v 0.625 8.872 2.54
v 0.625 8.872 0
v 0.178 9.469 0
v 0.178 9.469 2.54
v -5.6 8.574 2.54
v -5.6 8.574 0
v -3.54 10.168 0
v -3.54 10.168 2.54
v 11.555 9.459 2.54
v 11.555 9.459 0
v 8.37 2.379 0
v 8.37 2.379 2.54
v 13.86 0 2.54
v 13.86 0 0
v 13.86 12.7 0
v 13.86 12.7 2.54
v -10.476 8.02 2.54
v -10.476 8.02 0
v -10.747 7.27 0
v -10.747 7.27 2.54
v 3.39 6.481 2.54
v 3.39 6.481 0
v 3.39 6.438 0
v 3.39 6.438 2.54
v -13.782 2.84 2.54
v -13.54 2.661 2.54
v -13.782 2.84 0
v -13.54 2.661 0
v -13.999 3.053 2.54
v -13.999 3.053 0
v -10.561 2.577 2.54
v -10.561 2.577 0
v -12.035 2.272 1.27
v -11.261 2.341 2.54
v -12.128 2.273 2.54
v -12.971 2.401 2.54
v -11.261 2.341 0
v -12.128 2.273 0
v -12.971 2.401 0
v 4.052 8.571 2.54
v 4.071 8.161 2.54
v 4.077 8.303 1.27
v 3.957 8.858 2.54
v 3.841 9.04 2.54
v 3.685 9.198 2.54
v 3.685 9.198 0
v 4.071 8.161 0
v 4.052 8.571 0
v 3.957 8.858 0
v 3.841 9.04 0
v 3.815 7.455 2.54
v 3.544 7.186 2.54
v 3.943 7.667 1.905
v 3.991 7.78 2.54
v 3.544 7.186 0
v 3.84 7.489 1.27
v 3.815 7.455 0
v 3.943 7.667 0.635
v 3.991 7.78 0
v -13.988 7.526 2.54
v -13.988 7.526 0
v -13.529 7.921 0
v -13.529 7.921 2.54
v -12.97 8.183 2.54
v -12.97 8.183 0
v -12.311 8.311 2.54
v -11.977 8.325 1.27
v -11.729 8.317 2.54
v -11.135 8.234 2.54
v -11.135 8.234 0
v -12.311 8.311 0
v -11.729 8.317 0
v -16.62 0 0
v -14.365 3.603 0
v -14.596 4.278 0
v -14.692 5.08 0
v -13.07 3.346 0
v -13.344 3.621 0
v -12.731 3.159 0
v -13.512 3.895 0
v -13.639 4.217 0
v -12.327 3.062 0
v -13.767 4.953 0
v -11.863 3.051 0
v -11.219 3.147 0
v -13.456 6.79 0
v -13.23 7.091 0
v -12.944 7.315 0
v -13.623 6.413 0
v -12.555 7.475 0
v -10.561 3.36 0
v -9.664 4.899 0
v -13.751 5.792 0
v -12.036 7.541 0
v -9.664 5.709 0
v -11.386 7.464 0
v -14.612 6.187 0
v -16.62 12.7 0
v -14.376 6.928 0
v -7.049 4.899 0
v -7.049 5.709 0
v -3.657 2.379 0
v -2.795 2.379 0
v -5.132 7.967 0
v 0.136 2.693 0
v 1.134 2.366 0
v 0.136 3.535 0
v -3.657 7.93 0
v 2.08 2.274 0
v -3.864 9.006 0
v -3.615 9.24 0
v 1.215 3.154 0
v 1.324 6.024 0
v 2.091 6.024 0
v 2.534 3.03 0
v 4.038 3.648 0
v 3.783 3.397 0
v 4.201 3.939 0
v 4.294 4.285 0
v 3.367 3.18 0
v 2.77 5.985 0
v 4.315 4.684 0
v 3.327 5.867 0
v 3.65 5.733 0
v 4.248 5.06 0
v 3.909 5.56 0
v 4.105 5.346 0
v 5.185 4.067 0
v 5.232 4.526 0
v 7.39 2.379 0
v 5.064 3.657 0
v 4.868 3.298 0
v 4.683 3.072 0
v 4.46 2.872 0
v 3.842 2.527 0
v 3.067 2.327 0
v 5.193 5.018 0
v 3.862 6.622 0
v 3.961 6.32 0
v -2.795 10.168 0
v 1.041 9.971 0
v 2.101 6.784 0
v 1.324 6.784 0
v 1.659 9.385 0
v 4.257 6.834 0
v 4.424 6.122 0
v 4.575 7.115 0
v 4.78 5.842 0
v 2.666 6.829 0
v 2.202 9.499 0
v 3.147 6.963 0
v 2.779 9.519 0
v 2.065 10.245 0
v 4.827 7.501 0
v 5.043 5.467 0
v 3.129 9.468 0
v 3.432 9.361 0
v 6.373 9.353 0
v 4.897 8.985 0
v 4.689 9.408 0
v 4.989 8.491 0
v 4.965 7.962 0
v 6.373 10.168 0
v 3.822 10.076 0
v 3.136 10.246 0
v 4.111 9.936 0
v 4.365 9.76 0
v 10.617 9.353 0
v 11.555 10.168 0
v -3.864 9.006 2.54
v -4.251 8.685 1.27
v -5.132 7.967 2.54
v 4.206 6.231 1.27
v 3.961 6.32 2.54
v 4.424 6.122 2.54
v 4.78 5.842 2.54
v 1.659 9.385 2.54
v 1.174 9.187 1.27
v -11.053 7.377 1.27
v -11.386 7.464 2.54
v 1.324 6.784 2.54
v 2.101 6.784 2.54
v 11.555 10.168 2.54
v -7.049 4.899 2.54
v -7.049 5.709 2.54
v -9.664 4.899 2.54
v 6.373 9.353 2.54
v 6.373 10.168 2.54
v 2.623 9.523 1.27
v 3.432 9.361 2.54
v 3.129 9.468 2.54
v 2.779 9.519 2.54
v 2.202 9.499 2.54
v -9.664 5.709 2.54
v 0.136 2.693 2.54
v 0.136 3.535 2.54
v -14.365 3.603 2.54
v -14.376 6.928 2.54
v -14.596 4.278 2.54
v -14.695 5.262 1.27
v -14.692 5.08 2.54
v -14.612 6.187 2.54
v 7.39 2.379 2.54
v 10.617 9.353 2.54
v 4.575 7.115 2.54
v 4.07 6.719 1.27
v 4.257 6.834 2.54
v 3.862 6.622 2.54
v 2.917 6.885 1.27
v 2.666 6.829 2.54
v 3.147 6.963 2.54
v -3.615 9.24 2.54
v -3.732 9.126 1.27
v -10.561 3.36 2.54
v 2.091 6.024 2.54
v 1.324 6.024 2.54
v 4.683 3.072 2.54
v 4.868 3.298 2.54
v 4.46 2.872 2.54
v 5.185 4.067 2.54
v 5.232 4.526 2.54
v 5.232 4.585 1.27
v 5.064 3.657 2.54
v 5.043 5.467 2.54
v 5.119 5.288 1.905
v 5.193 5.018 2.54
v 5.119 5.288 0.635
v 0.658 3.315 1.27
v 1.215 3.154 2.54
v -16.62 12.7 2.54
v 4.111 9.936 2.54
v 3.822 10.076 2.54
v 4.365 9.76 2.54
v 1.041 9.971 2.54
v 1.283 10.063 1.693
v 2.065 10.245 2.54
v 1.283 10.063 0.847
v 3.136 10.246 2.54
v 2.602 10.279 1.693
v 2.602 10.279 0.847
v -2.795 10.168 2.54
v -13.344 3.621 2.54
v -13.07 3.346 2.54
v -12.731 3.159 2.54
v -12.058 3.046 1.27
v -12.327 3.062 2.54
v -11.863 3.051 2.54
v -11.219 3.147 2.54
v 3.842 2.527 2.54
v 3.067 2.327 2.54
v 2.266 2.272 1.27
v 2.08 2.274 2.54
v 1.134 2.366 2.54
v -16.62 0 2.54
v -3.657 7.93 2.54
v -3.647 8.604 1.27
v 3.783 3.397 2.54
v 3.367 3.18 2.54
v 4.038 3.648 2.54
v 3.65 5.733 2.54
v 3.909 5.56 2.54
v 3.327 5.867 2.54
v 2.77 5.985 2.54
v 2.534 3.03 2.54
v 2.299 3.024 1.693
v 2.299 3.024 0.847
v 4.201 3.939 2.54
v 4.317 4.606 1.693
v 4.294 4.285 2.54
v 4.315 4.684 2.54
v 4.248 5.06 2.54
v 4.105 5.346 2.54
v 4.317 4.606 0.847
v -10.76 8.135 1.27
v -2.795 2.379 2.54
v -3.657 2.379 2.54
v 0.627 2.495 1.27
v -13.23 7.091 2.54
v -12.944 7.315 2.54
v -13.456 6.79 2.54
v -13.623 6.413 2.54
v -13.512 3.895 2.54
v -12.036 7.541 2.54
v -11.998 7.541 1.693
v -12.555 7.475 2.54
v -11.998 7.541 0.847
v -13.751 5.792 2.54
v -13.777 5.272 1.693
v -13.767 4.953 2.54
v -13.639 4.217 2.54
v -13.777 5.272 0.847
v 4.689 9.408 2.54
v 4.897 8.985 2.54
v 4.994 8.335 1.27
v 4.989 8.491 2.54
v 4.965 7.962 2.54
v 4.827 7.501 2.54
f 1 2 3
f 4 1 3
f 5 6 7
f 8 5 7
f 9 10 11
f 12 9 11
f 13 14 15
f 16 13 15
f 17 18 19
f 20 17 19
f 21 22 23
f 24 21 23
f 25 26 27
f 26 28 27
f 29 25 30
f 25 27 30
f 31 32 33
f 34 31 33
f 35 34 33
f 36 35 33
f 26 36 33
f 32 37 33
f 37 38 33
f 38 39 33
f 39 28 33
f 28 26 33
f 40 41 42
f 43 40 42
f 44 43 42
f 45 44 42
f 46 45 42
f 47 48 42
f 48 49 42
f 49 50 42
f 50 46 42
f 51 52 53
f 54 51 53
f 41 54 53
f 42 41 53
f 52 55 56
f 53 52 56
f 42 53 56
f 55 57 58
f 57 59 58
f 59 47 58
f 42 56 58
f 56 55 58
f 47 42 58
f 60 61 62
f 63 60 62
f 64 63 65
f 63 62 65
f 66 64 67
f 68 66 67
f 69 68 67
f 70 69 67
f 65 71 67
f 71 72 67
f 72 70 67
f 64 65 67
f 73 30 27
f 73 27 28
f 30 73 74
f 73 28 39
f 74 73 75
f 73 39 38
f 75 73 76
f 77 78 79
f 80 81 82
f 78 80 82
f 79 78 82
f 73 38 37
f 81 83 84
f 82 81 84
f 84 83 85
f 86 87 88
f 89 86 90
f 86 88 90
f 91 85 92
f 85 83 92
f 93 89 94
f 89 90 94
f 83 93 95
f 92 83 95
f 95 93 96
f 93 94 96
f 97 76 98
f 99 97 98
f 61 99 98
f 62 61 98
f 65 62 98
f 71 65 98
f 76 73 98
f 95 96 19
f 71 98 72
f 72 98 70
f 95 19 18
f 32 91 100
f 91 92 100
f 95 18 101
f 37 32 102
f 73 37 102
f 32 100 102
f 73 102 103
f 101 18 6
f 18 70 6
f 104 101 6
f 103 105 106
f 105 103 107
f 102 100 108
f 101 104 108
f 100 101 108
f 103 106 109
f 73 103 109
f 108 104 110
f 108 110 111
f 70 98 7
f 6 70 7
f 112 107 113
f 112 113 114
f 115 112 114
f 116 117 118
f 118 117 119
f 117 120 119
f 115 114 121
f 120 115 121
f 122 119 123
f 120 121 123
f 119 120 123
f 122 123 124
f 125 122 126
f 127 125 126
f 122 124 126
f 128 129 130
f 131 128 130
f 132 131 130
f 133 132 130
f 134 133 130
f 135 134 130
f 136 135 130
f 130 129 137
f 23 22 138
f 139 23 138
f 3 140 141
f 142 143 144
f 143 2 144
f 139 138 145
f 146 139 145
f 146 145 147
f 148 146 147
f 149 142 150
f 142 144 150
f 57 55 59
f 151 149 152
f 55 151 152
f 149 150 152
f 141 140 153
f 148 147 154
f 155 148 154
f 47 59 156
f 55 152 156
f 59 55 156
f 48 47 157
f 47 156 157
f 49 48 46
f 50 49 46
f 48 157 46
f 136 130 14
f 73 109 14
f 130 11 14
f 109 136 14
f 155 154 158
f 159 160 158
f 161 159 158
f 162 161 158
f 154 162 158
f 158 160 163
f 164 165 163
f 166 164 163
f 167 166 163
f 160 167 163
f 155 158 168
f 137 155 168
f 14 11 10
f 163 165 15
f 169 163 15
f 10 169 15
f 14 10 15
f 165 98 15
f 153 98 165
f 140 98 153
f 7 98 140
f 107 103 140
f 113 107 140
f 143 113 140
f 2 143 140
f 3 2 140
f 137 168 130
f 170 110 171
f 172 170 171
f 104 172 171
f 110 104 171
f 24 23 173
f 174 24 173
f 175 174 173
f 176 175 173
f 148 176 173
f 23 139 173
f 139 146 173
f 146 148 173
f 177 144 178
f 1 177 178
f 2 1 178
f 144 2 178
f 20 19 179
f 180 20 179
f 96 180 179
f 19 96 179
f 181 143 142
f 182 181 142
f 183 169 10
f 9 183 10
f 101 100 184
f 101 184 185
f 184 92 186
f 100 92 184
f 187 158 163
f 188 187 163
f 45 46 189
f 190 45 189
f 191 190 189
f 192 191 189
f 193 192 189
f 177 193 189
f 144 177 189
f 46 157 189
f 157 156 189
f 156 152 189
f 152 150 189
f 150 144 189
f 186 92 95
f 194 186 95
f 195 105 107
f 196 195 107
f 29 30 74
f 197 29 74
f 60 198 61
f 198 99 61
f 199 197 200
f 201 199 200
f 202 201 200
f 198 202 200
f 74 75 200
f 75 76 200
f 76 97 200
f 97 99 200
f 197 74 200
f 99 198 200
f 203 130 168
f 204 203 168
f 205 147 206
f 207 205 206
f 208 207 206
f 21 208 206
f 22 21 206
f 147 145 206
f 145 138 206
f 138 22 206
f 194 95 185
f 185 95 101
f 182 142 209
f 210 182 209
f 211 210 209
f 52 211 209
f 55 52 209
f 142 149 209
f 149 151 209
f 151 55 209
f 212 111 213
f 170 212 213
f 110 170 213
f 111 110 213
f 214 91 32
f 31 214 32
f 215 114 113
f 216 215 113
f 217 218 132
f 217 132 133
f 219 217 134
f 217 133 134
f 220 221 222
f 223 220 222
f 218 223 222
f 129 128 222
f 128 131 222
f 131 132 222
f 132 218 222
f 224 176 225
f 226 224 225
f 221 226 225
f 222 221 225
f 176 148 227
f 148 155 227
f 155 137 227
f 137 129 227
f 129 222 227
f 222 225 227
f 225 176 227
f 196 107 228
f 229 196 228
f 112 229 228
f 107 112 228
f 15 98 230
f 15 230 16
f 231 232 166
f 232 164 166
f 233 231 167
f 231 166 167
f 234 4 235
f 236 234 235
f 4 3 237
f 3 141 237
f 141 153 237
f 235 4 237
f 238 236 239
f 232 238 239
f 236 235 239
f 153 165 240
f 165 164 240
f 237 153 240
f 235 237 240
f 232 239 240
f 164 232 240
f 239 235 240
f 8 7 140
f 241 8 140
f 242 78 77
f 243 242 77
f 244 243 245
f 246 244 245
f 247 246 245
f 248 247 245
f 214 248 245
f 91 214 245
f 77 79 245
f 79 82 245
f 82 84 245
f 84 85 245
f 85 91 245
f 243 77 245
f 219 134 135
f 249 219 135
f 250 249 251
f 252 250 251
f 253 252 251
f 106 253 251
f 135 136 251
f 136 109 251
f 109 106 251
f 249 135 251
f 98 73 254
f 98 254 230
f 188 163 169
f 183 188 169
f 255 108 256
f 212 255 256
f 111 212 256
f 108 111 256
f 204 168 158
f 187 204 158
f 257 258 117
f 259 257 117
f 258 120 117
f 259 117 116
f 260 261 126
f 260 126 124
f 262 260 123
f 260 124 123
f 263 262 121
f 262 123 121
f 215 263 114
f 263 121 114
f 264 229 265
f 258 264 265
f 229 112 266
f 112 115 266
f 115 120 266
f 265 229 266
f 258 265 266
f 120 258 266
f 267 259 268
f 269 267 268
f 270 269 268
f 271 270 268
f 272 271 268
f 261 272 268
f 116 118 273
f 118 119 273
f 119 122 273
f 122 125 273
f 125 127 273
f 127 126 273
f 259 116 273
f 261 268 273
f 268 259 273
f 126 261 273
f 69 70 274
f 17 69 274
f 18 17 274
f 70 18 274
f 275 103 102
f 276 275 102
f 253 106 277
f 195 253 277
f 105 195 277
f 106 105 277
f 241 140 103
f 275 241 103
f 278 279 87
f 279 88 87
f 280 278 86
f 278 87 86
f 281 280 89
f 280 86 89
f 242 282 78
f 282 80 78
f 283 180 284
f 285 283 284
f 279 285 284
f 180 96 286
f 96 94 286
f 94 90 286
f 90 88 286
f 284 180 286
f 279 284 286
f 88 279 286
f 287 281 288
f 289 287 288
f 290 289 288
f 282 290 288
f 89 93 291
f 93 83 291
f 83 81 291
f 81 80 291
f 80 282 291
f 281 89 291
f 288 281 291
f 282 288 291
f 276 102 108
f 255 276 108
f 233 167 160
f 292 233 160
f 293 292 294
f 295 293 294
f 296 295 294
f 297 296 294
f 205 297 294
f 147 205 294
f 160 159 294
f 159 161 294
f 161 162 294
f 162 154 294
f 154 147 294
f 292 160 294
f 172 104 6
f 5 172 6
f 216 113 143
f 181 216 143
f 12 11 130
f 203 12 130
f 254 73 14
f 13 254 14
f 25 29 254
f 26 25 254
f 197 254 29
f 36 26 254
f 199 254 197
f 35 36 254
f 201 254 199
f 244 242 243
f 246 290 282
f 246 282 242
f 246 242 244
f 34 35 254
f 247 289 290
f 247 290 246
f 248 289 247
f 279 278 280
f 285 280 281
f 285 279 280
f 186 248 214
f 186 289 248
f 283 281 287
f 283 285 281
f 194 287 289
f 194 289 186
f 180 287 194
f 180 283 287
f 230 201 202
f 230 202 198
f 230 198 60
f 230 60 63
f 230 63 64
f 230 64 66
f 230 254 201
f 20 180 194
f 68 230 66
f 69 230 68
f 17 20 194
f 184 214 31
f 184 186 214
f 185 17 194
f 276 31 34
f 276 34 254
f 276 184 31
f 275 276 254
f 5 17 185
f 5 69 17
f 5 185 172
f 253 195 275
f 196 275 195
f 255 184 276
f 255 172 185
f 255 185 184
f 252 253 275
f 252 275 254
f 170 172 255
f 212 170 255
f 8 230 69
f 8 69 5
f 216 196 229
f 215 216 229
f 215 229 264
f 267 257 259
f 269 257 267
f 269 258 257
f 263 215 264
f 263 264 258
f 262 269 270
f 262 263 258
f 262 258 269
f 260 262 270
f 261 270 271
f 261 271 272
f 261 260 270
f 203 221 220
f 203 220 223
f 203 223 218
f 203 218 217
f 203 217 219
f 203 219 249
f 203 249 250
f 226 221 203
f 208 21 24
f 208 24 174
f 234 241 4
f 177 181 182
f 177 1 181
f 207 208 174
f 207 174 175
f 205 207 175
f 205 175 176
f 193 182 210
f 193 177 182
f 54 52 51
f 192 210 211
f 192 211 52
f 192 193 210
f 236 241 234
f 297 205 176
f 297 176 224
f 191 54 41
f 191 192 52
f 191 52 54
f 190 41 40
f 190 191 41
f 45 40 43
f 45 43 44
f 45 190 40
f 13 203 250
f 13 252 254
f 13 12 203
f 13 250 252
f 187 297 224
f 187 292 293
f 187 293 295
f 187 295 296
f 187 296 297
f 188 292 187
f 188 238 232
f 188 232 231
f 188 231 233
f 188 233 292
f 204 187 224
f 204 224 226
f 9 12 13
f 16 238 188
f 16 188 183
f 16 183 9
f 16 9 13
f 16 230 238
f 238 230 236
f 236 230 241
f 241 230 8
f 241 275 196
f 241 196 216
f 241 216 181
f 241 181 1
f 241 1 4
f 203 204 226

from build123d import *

# Parameters (mm, degrees)
F0_W     = 30.48
F0_H     = 12.7
F0_W_2   = 2.6148700127
F0_H_2   = 0.8096892152
F1_DEPTH = 2.54


with BuildPart() as f1:
    # F0 (on Top) → F1 (new body)
    with BuildSketch(Plane.XY):
        with Locations((-1.3798511758, 6.35)):
            Rectangle(F0_W, F0_H)
        with BuildLine():
            add(Edge.make_bspline(
                [(-10.5608947585, 2.57717929), (-11.1455756023, 2.2720543016), (-12.0353814345, 2.2720543016)],
                knots=[0, 0, 0, 1, 1, 1], degree=2))
            add(Edge.make_bspline(
                [(-12.0353814345, 2.2720543016), (-13.3036104368, 2.2720543016), (-13.9990908573, 3.0527651659)],
                knots=[0, 0, 0, 1, 1, 1], degree=2))
            add(Edge.make_bspline(
                [(-13.9990908573, 3.0527651659), (-14.6945712779, 3.8334760301), (-14.6945712779, 5.2619382666)],
                knots=[0, 0, 0, 1, 1, 1], degree=2))
            add(Edge.make_bspline(
                [(-14.6945712779, 5.2619382666), (-14.6945712779, 6.7261972893), (-13.9880108997, 7.5256588512)],
                knots=[0, 0, 0, 1, 1, 1], degree=2))
            add(Edge.make_bspline(
                [(-13.9880108997, 7.5256588512), (-13.2814505214, 8.3251204131), (-11.9774247328, 8.3251204131)],
                knots=[0, 0, 0, 1, 1, 1], degree=2))
            add(Edge.make_bspline(
                [(-11.9774247328, 8.3251204131), (-11.5563863409, 8.3251204131), (-11.135347949, 8.2339238384)],
                knots=[0, 0, 0, 1, 1, 1], degree=2))
            add(Edge.make_bspline(
                [(-11.135347949, 8.2339238384), (-10.7143095571, 8.1427272636), (-10.4756643148, 8.0199954247)],
                knots=[0, 0, 0, 1, 1, 1], degree=2))
            Line((-10.4756643148, 8.0199954247), (-10.7466971257, 7.2699675201))
            add(Edge.make_bspline(
                [(-10.7466971257, 7.2699675201), (-11.0398898521, 7.3875855324), (-11.3859254535, 7.4642929318)],
                knots=[0, 0, 0, 1, 1, 1], degree=2))
            add(Edge.make_bspline(
                [(-11.3859254535, 7.4642929318), (-11.7319610549, 7.5410003311), (-11.9978800393, 7.5410003311)],
                knots=[0, 0, 0, 1, 1, 1], degree=2))
            add(Edge.make_bspline(
                [(-11.9978800393, 7.5410003311), (-13.7774917037, 7.5410003311), (-13.7774917037, 5.2721659198)],
                knots=[0, 0, 0, 1, 1, 1], degree=2))
            add(Edge.make_bspline(
                [(-13.7774917037, 5.2721659198), (-13.7774917037, 4.1965577203), (-13.3436687453, 3.6212522253)],
                knots=[0, 0, 0, 1, 1, 1], degree=2))
            add(Edge.make_bspline(
                [(-13.3436687453, 3.6212522253), (-12.9098457869, 3.0459467304), (-12.0575413499, 3.0459467304)],
                knots=[0, 0, 0, 1, 1, 1], degree=2))
            add(Edge.make_bspline(
                [(-12.0575413499, 3.0459467304), (-11.3279687518, 3.0459467304), (-10.5608947585, 3.3595947632)],
                knots=[0, 0, 0, 1, 1, 1], degree=2))
            Line((-10.5608947585, 3.3595947632), (-10.5608947585, 2.57717929))
        make_face(mode=Mode.SUBTRACT)
        with Locations((-8.3568354844, 5.303701184)):
            Rectangle(F0_W_2, F0_H_2, mode=Mode.SUBTRACT)
        with BuildLine():
            Line((-2.7946967285, 10.1678026059), (-2.7946967285, 2.3794446606))
            Line((-2.7946967285, 2.3794446606), (-3.6572288188, 2.3794446606))
            Line((-3.6572288188, 2.3794446606), (-3.6572288188, 7.9296511544))
            add(Edge.make_bspline(
                [(-3.6572288188, 7.9296511544), (-3.6572288188, 8.6234269661), (-3.6146135969, 9.2404953785)],
                knots=[0, 0, 0, 1, 1, 1], degree=2))
            add(Edge.make_bspline(
                [(-3.6146135969, 9.2404953785), (-3.7254131737, 9.1279911928), (-3.864338797, 9.0061116583)],
                knots=[0, 0, 0, 1, 1, 1], degree=2))
            add(Edge.make_bspline(
                [(-3.864338797, 9.0061116583), (-4.0032644202, 8.8842321238), (-5.1317154948, 7.9671525496)],
                knots=[0, 0, 0, 1, 1, 1], degree=2))
            Line((-5.1317154948, 7.9671525496), (-5.6004829351, 8.5739933088))
            Line((-5.6004829351, 8.5739933088), (-3.5396108065, 10.1678026059))
            Line((-3.5396108065, 10.1678026059), (-2.7946967285, 10.1678026059))
        make_face(mode=Mode.SUBTRACT)
        with BuildLine():
            add(Edge.make_bspline(
                [(4.3646605423, 9.7595487806), (4.9936612168, 9.2404953785), (4.9936612168, 8.3353480664)],
                knots=[0, 0, 0, 1, 1, 1], degree=2))
            add(Edge.make_bspline(
                [(4.9936612168, 8.3353480664), (4.9936612168, 7.5887293796), (4.5751797382, 7.1148481126)],
                knots=[0, 0, 0, 1, 1, 1], degree=2))
            add(Edge.make_bspline(
                [(4.5751797382, 7.1148481126), (4.1566982597, 6.6409668456), (3.3896242664, 6.4807336115)],
                knots=[0, 0, 0, 1, 1, 1], degree=2))
            Line((3.3896242664, 6.4807336115), (3.3896242664, 6.4381183896))
            add(Edge.make_bspline(
                [(3.3896242664, 6.4381183896), (4.3271591471, 6.3222049862), (4.7797328031, 5.8423575882)],
                knots=[0, 0, 0, 1, 1, 1], degree=2))
            add(Edge.make_bspline(
                [(4.7797328031, 5.8423575882), (5.2323064592, 5.3625101901), (5.2323064592, 4.5852085436)],
                knots=[0, 0, 0, 1, 1, 1], degree=2))
            add(Edge.make_bspline(
                [(5.2323064592, 4.5852085436), (5.2323064592, 3.4720989489), (4.4601186392, 2.8720766252)],
                knots=[0, 0, 0, 1, 1, 1], degree=2))
            add(Edge.make_bspline(
                [(4.4601186392, 2.8720766252), (3.6879308193, 2.2720543016), (2.2662870184, 2.2720543016)],
                knots=[0, 0, 0, 1, 1, 1], degree=2))
            add(Edge.make_bspline(
                [(2.2662870184, 2.2720543016), (1.6475139971, 2.2720543016), (1.1335744216, 2.3658077896)],
                knots=[0, 0, 0, 1, 1, 1], degree=2))
            add(Edge.make_bspline(
                [(1.1335744216, 2.3658077896), (0.6196348461, 2.4595612777), (0.1355259259, 2.6930926934)],
                knots=[0, 0, 0, 1, 1, 1], degree=2))
            Line((0.1355259259, 2.6930926934), (0.1355259259, 3.5351694772))
            add(Edge.make_bspline(
                [(0.1355259259, 3.5351694772), (0.6417947615, 3.2845919727), (1.2145433431, 3.1541893939)],
                knots=[0, 0, 0, 1, 1, 1], degree=2))
            add(Edge.make_bspline(
                [(1.2145433431, 3.1541893939), (1.7872919248, 3.023786815), (2.298674587, 3.023786815)],
                knots=[0, 0, 0, 1, 1, 1], degree=2))
            add(Edge.make_bspline(
                [(2.298674587, 3.023786815), (4.3169314938, 3.023786815), (4.3169314938, 4.6056638501)],
                knots=[0, 0, 0, 1, 1, 1], degree=2))
            add(Edge.make_bspline(
                [(4.3169314938, 4.6056638501), (4.3169314938, 6.0238984332), (2.0907123044, 6.0238984332)],
                knots=[0, 0, 0, 1, 1, 1], degree=2))
            Line((2.0907123044, 6.0238984332), (1.3236383111, 6.0238984332))
            Line((1.3236383111, 6.0238984332), (1.3236383111, 6.784153991))
            Line((1.3236383111, 6.784153991), (2.1009399576, 6.784153991))
            add(Edge.make_bspline(
                [(2.1009399576, 6.784153991), (3.0112010963, 6.784153991), (3.5438913695, 7.1864416853)],
                knots=[0, 0, 0, 1, 1, 1], degree=2))
            add(Edge.make_bspline(
                [(3.5438913695, 7.1864416853), (4.0765816426, 7.5887293796), (4.0765816426, 8.3029604978)],
                knots=[0, 0, 0, 1, 1, 1], degree=2))
            add(Edge.make_bspline(
                [(4.0765816426, 8.3029604978), (4.0765816426, 8.8722998617), (3.685373906, 9.1978801566)],
                knots=[0, 0, 0, 1, 1, 1], degree=2))
            add(Edge.make_bspline(
                [(3.685373906, 9.1978801566), (3.2941661694, 9.5234604516), (2.6225502731, 9.5234604516)],
                knots=[0, 0, 0, 1, 1, 1], degree=2))
            add(Edge.make_bspline(
                [(2.6225502731, 9.5234604516), (2.1111676109, 9.5234604516), (1.6585939548, 9.3845348283)],
                knots=[0, 0, 0, 1, 1, 1], degree=2))
            add(Edge.make_bspline(
                [(1.6585939548, 9.3845348283), (1.2060202988, 9.2456092051), (0.6247486727, 8.8722998617)],
                knots=[0, 0, 0, 1, 1, 1], degree=2))
            Line((0.6247486727, 8.8722998617), (0.1781411477, 9.4689129676))
            add(Edge.make_bspline(
                [(0.1781411477, 9.4689129676), (0.6571362413, 9.8473361376), (1.2827276981, 10.0629691602)],
                knots=[0, 0, 0, 1, 1, 1], degree=2))
            add(Edge.make_bspline(
                [(1.2827276981, 10.0629691602), (1.9083191549, 10.2786021828), (2.6020949666, 10.2786021828)],
                knots=[0, 0, 0, 1, 1, 1], degree=2))
            add(Edge.make_bspline(
                [(2.6020949666, 10.2786021828), (3.7356598678, 10.2786021828), (4.3646605423, 9.7595487806)],
                knots=[0, 0, 0, 1, 1, 1], degree=2))
        make_face(mode=Mode.SUBTRACT)
        Polygon((8.3704913962, 2.3794446606), (7.3903412937, 2.3794446606), (10.6171658921, 9.3529995642), (6.3726897959, 9.3529995642), (6.3726897959, 10.1678026059), (11.5547007729, 10.1678026059), (11.5547007729, 9.4586853144), align=None, mode=Mode.SUBTRACT)
    extrude(amount=F1_DEPTH)


solid = f1.part
